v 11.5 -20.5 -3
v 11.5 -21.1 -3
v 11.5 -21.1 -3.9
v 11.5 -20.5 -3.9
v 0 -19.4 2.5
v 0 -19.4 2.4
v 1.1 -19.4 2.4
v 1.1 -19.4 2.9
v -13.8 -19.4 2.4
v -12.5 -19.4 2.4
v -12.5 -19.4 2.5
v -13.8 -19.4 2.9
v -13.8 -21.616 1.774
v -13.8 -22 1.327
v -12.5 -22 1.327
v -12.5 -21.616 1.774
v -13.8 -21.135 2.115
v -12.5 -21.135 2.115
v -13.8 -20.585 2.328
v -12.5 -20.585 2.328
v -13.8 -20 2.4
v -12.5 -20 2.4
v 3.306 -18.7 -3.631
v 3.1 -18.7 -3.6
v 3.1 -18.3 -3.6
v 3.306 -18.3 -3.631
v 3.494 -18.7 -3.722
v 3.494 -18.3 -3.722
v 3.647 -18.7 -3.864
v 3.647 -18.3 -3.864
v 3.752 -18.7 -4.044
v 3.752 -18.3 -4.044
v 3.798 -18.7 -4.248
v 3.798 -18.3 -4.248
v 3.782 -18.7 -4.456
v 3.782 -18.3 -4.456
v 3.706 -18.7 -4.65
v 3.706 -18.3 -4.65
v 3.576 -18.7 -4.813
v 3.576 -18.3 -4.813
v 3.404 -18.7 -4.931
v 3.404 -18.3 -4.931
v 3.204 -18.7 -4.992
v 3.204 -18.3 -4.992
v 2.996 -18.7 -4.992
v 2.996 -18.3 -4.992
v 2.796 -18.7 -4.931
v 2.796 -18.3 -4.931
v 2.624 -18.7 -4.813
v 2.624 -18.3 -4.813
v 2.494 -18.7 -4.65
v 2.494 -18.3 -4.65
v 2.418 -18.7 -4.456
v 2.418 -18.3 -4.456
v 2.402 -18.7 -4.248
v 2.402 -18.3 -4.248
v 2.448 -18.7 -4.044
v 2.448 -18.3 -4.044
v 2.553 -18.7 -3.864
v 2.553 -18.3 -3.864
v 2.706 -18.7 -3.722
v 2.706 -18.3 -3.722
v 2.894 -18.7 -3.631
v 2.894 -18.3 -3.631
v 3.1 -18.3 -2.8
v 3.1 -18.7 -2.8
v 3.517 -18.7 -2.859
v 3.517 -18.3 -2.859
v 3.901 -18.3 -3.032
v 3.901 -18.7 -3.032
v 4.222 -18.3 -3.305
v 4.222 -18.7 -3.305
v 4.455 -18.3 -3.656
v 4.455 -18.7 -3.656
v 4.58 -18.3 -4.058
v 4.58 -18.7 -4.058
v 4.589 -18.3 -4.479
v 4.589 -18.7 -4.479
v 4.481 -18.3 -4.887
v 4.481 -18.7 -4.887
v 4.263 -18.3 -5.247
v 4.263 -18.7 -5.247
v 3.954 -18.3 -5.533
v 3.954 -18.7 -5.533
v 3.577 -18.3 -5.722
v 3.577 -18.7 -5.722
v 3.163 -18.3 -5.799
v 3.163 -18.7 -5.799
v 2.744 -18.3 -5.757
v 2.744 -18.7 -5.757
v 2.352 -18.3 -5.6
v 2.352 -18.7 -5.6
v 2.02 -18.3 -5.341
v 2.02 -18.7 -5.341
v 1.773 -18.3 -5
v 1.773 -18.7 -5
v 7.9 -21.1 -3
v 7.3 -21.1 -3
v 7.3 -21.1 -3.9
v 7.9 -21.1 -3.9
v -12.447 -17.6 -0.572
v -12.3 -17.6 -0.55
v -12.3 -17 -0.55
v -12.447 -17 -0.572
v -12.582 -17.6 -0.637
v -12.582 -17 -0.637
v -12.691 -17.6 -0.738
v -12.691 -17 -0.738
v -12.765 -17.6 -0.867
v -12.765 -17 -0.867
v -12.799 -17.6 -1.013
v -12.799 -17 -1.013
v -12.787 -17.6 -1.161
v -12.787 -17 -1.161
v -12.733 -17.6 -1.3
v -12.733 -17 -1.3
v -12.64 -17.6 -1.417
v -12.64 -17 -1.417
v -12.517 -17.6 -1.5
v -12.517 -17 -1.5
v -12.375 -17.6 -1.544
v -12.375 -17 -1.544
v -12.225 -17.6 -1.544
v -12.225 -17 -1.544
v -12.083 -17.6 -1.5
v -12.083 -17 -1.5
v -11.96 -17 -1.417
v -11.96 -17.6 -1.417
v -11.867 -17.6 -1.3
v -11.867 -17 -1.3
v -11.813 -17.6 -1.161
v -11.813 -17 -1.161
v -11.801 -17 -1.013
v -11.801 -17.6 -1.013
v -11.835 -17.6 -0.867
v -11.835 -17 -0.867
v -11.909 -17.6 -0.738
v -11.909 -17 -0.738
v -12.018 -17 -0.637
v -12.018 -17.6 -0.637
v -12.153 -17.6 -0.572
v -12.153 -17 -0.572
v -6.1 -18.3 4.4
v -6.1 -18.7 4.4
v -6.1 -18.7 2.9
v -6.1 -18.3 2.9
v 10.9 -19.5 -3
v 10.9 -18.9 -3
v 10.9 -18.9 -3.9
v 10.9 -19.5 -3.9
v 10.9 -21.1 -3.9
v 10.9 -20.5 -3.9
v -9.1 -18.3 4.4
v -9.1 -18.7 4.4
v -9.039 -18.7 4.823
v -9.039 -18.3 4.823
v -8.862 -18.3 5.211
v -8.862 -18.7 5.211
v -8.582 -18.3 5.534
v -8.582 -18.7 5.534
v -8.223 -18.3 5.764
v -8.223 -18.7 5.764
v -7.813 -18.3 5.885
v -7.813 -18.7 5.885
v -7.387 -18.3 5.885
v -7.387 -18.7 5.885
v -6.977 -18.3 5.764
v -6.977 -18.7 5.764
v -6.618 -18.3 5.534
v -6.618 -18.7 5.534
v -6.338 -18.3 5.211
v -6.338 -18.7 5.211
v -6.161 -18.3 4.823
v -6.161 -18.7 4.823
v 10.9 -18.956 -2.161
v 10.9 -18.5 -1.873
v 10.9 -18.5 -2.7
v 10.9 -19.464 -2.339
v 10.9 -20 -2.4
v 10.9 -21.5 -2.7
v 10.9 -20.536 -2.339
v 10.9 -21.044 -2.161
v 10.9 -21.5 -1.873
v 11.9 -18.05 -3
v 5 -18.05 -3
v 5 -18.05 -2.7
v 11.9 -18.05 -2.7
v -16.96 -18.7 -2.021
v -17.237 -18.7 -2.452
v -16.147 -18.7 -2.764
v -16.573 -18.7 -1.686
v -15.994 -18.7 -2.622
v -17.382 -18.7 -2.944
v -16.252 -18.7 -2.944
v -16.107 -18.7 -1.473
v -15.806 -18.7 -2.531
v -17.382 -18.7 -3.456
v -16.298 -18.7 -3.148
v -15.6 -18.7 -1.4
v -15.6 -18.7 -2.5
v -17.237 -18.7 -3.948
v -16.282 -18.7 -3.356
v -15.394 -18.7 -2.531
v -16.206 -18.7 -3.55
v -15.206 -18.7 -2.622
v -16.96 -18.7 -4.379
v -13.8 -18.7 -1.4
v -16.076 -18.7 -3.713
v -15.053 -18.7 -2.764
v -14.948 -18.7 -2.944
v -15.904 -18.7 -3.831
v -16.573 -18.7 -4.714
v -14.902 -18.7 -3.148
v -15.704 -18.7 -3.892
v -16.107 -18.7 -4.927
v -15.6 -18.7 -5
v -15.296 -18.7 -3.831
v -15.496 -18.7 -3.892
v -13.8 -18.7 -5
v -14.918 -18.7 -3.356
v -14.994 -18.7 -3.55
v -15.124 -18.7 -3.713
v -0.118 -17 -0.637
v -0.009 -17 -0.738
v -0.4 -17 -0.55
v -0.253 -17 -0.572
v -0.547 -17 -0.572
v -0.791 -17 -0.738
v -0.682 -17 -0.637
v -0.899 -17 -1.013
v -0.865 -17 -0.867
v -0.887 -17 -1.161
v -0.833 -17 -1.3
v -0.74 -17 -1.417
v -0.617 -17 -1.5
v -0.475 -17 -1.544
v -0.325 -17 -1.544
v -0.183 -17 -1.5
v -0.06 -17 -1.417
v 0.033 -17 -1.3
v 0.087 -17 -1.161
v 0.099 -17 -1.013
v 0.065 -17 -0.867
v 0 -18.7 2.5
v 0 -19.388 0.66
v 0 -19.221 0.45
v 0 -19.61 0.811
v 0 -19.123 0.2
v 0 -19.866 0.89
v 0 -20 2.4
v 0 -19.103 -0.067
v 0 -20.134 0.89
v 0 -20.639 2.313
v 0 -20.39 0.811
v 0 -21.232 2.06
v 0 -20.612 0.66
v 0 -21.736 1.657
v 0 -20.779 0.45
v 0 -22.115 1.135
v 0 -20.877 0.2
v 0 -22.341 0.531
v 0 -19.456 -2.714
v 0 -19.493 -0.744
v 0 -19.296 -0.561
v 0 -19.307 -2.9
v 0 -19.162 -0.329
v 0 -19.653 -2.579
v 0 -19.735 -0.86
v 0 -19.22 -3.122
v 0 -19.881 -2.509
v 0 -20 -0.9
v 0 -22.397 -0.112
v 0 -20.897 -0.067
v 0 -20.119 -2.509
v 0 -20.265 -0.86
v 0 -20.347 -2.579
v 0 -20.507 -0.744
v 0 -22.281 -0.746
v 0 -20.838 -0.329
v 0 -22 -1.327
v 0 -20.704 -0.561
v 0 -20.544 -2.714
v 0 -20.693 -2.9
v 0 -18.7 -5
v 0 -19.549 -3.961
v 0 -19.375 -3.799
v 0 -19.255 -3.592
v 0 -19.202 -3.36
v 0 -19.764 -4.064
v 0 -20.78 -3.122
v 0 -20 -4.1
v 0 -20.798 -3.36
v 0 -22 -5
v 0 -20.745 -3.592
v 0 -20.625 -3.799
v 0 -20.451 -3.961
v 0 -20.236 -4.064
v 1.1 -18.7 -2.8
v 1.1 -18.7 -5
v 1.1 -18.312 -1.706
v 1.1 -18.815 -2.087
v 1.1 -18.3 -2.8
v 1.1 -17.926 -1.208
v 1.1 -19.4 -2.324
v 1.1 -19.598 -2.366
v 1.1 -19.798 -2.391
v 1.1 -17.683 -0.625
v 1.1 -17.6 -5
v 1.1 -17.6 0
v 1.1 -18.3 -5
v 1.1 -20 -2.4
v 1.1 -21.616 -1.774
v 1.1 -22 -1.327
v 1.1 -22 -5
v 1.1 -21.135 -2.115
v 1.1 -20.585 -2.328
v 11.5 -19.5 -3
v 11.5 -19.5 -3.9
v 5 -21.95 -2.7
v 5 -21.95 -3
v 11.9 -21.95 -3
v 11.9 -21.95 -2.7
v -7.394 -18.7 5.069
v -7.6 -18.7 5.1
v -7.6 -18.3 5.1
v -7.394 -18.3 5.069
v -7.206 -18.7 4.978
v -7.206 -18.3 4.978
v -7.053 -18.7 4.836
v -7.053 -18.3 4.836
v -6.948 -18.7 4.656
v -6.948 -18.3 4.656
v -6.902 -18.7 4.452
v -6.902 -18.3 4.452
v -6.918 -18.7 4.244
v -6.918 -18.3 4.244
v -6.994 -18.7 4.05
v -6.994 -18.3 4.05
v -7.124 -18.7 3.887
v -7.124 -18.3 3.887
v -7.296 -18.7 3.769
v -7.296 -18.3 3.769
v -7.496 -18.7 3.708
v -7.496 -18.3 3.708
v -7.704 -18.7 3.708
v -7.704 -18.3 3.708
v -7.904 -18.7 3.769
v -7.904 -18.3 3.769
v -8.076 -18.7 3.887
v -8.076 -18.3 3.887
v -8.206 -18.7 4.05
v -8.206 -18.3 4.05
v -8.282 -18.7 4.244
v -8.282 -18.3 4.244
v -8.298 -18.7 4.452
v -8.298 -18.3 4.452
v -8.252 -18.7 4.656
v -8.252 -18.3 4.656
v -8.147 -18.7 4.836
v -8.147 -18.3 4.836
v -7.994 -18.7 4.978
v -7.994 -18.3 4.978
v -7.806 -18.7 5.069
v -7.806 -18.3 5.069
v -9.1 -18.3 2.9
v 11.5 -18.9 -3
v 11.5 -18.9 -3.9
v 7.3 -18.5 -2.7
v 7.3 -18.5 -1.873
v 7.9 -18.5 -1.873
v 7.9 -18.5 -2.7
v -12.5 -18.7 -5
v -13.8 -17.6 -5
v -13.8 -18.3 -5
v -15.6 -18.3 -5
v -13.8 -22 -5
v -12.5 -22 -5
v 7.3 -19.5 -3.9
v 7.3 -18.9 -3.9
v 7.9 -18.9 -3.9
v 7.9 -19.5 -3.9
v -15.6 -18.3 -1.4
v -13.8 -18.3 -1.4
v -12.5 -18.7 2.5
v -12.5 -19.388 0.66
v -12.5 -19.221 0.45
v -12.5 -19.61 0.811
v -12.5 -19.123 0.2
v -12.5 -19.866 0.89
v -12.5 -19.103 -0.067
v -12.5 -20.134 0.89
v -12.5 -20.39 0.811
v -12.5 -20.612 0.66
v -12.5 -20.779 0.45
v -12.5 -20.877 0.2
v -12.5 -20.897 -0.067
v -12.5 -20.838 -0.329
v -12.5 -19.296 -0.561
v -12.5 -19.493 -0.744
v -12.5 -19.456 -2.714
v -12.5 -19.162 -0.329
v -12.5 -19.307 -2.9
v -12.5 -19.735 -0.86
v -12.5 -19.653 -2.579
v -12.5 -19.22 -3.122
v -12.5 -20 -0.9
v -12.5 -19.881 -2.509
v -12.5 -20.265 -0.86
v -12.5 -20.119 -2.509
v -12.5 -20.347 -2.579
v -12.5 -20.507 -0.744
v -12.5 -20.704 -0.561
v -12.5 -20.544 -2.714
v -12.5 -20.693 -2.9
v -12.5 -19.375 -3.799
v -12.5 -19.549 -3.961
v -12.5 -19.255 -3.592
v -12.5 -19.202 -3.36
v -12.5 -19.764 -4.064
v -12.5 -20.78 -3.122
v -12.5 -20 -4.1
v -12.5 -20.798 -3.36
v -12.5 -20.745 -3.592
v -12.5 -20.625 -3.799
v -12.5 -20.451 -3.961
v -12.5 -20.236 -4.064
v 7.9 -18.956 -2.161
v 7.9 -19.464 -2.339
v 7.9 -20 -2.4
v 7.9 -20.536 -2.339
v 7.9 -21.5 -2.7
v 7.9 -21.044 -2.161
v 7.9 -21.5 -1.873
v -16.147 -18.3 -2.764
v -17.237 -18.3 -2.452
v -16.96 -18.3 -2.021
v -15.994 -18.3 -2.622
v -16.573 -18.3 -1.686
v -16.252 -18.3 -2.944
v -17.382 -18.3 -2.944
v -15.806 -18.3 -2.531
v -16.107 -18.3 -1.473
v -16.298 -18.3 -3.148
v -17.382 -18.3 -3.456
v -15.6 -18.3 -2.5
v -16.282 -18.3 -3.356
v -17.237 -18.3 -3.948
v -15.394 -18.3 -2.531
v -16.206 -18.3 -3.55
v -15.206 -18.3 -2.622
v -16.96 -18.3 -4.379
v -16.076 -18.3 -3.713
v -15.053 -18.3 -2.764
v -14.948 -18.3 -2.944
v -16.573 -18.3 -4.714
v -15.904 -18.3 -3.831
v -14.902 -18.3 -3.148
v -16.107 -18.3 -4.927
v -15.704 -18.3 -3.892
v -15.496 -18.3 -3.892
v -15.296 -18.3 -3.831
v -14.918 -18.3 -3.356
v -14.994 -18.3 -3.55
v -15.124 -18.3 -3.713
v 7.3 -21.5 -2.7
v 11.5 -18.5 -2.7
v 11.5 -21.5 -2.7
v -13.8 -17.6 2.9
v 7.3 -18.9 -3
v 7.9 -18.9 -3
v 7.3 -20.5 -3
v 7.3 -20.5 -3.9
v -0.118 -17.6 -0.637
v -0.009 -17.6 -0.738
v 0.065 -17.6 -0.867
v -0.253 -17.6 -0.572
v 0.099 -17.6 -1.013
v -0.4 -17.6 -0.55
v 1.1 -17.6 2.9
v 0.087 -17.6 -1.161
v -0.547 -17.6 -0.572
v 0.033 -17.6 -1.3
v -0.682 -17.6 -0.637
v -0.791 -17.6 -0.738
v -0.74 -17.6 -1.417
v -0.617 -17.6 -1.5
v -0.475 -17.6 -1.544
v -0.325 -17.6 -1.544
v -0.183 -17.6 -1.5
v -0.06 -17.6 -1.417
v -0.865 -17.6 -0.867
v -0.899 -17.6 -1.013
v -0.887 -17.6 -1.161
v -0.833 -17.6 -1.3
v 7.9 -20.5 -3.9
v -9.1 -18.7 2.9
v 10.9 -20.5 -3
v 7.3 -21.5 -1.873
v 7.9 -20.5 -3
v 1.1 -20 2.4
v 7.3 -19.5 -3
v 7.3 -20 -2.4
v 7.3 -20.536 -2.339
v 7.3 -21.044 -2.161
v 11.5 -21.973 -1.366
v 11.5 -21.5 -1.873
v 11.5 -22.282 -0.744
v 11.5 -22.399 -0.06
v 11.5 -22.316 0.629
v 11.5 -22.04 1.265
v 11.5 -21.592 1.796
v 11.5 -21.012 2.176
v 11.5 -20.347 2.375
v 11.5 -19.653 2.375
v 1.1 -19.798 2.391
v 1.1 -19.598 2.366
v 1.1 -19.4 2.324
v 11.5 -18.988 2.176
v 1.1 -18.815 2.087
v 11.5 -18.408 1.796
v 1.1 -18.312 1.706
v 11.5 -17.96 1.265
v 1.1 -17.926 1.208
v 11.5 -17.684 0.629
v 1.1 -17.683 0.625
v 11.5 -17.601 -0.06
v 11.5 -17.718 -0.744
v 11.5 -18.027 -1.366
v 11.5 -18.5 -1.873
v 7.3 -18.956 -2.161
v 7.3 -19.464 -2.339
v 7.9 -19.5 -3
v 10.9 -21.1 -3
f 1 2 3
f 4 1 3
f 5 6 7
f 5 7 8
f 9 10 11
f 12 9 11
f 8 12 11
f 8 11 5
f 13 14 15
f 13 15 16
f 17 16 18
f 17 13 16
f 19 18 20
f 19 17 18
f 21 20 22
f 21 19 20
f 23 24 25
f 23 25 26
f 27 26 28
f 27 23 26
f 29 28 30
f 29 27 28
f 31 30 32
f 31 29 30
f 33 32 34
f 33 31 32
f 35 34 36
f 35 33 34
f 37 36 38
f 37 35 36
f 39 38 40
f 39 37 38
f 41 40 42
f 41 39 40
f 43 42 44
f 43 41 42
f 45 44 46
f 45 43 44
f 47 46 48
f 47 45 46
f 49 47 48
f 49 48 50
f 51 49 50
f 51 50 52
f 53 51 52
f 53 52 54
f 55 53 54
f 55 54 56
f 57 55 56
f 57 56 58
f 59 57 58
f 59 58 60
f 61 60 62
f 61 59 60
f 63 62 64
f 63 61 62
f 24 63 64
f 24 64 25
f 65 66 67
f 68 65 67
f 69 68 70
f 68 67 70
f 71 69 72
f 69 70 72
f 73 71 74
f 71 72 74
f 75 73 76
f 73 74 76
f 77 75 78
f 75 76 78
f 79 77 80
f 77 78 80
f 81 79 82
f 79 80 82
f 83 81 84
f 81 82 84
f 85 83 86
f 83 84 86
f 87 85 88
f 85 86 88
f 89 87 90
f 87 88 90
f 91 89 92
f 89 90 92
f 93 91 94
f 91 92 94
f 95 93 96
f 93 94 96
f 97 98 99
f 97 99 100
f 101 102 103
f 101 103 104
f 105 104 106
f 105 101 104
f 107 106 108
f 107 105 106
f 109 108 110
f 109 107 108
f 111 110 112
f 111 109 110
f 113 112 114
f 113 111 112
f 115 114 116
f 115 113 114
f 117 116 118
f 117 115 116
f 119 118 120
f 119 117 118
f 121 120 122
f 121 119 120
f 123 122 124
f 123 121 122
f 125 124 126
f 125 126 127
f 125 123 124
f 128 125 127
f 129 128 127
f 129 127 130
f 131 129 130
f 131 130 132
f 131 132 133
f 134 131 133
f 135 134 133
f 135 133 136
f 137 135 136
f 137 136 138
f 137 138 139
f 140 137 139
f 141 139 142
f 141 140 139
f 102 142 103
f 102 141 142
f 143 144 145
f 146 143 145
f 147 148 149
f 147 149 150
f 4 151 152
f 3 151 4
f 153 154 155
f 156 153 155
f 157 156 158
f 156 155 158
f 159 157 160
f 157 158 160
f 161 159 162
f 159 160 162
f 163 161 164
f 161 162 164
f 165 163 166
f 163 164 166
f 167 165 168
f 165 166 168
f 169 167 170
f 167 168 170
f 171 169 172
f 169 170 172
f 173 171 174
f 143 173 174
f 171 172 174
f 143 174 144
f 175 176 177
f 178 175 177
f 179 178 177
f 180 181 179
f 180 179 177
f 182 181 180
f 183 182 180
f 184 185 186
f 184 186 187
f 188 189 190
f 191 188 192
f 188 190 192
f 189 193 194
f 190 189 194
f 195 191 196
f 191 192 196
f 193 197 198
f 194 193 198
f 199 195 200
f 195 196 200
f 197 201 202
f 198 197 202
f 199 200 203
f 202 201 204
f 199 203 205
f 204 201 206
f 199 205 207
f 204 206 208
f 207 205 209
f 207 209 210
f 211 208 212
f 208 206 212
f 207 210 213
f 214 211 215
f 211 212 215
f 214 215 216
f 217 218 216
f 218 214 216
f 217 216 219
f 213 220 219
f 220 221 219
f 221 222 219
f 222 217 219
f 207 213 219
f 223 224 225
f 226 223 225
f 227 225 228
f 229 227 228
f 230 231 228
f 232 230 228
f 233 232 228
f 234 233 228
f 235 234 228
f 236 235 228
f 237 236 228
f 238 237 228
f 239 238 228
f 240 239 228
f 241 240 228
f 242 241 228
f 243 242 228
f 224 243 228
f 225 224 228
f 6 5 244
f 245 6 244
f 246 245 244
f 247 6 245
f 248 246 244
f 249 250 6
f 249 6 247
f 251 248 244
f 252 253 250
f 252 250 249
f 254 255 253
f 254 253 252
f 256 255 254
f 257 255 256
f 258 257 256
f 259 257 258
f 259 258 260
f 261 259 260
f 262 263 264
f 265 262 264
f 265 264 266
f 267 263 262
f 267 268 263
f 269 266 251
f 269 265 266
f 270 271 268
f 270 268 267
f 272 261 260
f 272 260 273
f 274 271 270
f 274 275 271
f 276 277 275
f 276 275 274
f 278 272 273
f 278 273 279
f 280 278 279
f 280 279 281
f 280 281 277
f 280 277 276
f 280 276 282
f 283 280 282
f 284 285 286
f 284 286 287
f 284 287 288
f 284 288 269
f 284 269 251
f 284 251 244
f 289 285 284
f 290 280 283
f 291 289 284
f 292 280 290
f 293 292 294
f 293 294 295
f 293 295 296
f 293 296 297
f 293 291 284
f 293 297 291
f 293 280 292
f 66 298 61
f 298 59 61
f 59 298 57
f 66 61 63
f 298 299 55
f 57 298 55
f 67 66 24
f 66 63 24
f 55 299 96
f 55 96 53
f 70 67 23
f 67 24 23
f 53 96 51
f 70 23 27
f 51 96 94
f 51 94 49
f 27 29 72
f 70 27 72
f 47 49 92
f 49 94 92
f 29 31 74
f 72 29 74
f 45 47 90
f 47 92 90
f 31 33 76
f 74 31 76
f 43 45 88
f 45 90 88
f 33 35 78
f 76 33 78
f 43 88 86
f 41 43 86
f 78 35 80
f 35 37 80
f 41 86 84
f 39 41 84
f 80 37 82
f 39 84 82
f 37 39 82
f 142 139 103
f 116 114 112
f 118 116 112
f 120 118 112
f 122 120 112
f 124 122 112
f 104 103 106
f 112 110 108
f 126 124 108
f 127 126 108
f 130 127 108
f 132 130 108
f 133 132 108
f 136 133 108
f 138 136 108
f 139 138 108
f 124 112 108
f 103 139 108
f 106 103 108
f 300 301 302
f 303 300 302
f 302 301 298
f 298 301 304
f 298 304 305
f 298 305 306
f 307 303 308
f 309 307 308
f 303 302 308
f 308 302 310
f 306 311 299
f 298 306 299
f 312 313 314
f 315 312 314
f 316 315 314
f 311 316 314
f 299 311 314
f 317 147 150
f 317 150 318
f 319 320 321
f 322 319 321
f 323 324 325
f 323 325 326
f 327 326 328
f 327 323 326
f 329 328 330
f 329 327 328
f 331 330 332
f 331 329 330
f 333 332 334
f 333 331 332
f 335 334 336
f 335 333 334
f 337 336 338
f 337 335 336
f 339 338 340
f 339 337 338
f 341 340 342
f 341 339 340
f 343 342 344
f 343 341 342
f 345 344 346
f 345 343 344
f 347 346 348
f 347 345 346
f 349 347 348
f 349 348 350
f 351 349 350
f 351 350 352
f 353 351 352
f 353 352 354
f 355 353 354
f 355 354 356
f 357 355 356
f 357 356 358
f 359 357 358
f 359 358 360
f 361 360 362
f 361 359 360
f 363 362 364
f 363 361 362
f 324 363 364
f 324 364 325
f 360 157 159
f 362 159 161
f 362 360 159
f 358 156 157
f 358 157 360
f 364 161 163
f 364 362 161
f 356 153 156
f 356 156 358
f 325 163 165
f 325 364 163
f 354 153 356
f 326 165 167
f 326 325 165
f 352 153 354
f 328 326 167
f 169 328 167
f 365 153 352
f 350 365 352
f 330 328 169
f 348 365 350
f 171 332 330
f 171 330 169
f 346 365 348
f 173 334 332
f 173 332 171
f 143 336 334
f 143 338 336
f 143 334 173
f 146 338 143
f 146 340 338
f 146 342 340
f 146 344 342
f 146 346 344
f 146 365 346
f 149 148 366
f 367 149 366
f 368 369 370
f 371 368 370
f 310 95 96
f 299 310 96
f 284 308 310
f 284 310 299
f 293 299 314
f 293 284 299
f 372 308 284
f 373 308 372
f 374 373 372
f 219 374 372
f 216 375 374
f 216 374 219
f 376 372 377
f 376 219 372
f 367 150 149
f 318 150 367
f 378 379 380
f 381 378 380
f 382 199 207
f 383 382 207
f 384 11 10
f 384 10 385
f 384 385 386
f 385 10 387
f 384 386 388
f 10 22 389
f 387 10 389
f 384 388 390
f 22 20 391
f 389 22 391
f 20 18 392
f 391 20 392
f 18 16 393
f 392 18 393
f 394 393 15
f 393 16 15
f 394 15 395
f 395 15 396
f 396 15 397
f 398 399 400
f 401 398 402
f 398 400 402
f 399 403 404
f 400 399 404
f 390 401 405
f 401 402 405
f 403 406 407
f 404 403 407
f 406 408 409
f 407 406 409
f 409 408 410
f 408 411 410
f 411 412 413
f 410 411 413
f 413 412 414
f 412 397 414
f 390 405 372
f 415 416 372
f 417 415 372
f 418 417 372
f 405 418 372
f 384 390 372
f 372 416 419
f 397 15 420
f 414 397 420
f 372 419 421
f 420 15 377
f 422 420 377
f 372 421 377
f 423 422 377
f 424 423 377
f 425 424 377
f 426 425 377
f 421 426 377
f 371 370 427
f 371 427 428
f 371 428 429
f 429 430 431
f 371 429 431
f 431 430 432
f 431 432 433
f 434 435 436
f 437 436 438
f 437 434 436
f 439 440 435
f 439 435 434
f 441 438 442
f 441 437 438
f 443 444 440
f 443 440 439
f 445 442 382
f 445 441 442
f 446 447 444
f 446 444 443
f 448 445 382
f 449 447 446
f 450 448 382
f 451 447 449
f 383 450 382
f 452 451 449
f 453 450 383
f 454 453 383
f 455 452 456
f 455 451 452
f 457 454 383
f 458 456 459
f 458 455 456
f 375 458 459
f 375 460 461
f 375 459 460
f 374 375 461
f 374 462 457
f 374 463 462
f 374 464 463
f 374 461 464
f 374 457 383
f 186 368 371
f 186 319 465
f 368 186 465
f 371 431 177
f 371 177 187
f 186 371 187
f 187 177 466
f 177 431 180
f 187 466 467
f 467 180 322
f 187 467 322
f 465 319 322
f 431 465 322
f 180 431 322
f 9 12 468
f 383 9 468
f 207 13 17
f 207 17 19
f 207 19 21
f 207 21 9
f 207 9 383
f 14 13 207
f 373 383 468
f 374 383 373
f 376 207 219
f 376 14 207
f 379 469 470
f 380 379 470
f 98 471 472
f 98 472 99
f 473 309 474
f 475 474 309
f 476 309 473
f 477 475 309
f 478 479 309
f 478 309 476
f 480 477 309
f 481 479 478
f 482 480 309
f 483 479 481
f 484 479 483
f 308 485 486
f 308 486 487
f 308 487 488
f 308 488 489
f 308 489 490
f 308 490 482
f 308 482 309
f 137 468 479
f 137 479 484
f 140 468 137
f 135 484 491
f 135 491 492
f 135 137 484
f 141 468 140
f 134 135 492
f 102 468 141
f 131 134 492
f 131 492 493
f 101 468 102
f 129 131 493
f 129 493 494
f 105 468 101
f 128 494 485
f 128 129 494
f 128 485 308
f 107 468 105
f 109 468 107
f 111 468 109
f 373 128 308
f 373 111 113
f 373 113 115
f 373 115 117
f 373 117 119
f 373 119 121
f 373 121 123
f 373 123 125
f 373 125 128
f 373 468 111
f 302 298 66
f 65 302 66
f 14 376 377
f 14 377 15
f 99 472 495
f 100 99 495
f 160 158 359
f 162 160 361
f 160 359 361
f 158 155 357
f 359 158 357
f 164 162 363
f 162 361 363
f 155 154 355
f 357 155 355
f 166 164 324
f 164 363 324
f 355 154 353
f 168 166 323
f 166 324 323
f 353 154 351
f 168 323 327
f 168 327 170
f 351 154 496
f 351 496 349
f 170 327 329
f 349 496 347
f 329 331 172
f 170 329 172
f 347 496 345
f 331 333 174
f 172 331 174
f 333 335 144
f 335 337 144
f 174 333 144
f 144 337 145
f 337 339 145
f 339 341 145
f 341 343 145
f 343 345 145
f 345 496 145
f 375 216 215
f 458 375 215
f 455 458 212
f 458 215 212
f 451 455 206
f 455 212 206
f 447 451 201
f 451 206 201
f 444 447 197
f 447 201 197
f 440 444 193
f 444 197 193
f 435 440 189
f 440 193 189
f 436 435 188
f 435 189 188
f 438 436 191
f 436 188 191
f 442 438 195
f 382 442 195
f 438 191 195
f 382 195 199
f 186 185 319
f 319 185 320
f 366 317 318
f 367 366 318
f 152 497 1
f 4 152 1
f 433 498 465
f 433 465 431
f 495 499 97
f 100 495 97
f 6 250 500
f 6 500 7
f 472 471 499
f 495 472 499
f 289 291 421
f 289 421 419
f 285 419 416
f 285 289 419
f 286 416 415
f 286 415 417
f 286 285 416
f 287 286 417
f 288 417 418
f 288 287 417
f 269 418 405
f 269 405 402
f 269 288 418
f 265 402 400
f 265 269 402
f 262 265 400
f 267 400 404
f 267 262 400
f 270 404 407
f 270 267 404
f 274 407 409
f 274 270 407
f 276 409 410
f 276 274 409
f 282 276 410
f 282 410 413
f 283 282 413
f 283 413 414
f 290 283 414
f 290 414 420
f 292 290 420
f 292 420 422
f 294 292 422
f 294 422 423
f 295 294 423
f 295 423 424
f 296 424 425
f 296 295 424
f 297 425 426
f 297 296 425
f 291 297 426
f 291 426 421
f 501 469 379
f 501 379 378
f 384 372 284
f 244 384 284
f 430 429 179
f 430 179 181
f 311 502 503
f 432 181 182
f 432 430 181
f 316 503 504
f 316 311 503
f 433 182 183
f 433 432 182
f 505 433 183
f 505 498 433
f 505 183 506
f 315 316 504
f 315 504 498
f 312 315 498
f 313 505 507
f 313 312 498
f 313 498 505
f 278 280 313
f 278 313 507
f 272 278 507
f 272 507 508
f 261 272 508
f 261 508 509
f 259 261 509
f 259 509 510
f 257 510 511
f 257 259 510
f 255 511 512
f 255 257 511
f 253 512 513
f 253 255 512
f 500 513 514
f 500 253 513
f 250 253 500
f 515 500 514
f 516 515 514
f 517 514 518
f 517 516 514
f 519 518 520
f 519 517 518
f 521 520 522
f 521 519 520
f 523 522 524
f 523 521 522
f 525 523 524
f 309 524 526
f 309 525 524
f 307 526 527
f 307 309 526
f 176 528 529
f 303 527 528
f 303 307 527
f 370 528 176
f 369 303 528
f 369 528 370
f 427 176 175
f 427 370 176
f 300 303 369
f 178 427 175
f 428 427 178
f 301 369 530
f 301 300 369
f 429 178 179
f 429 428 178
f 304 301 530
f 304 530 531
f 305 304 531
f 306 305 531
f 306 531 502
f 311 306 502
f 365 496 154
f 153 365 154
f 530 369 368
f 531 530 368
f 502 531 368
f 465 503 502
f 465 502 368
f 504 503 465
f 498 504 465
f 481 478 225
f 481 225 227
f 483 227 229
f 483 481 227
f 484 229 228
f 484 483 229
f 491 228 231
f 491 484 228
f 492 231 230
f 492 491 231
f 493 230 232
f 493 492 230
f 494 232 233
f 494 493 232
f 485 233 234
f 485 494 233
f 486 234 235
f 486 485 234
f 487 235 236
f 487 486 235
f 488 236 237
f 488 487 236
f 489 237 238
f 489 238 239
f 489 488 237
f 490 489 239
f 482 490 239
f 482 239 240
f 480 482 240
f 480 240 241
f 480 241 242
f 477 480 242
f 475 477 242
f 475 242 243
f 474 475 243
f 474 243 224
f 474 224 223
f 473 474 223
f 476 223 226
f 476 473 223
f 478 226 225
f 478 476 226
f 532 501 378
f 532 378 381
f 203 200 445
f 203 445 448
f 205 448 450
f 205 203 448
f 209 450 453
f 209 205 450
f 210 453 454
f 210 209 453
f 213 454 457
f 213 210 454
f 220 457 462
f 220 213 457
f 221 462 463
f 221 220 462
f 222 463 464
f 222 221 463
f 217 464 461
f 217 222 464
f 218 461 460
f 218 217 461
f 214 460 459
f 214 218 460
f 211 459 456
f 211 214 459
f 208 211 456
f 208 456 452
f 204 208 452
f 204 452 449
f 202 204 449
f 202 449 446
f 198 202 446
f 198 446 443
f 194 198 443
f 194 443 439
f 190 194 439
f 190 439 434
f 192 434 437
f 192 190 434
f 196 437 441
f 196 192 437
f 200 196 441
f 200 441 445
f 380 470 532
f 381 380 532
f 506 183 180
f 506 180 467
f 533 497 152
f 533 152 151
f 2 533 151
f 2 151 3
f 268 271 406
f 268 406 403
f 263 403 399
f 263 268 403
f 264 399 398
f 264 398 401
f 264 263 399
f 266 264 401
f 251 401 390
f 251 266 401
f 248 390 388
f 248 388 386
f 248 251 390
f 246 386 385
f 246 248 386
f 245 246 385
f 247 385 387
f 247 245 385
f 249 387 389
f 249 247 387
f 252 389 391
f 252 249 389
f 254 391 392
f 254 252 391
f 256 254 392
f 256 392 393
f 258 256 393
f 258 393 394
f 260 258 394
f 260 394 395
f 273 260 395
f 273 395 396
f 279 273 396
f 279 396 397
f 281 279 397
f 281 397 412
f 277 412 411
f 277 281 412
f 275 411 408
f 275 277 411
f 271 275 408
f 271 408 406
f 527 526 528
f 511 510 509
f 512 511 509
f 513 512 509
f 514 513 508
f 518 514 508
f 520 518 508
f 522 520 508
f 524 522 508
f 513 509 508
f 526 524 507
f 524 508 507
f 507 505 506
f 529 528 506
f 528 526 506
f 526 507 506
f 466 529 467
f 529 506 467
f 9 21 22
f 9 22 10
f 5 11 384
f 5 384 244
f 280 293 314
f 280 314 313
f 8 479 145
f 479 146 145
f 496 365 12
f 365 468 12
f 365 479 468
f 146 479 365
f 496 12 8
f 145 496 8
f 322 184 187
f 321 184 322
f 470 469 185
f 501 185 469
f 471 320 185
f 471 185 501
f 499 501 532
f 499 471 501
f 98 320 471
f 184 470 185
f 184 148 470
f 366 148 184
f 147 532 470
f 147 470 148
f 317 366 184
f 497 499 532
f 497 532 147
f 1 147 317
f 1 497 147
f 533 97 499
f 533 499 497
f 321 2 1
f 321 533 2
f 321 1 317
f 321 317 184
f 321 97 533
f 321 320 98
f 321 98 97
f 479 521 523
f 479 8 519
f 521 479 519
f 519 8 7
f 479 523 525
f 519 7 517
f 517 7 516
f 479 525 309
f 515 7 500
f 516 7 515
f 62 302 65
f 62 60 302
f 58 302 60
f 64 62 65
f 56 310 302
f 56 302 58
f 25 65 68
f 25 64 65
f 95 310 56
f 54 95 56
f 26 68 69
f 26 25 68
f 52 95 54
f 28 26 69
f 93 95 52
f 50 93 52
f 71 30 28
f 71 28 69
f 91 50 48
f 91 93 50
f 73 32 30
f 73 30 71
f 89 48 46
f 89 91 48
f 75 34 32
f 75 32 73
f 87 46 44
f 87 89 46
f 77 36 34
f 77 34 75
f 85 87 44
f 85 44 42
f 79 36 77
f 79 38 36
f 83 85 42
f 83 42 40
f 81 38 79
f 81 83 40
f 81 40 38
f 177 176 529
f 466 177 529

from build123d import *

# Parameters (mm, degrees)
SKETCH_1_R          = 2.4
EXTRUDE_1_DEPTH     = 11.5
SKETCH_1_7_W        = 0.5
SKETCH_1_7_H        = 1.8
EXTRUDE_3_DEPTH     = 1.1
EXTRUDE_START       = -13.8
SKETCH_1_8_W        = 0.5
SKETCH_1_8_H        = 1.8
EXTRUDE_4_DEPTH     = 14.9
EXTRUDE_5_DEPTH     = 1.3
SKETCH_3_W          = 0.6
SKETCH_3_H          = 0.6
EXTRUDE_6_DEPTH     = 3.9
SKETCH_3_3_W        = 0.6
SKETCH_3_3_H        = 3
EXTRUDE_7_DEPTH     = 3
EXTRUDE_START_2     = -3
SKETCH_4_W          = 6.9
SKETCH_4_H          = 3.9
EXTRUDE_8_DEPTH     = 0.3
SKETCH_6_W          = 12.5
SKETCH_6_H          = 7.5
CUT_EXTRUDE_1_DEPTH = 0.7
EXTRUDE_START_3     = -1.3
SKETCH_5_R          = 0.7
EXTRUDE_9_DEPTH     = 0.4
SKETCH_7_R          = 0.9
SKETCH_7_R_2        = 0.8
EXTRUDE_10_DEPTH    = 12.5
SKETCH_8_R          = 0.5
EXTRUDE_11_DEPTH    = 0.6
SKETCH_9_W          = 55.778584291
SKETCH_9_H          = 36.536448335
CUT_EXTRUDE_2_DEPTH = 23.165964901


with BuildPart() as part:
    # 草图1 → 凸台-拉伸1 (new body)
    with BuildSketch(Plane(origin=(0, 0, 0), x_dir=(0, 0, -1), z_dir=(1, 0, 0))):
        Circle(SKETCH_1_R)
    extrude(amount=EXTRUDE_1_DEPTH)

    # 草图1<7> → 凸台-拉伸3 (add)
    with BuildSketch(Plane(origin=(0, 0, 0), x_dir=(0, 0, -1), z_dir=(1, 0, 0))):
        with BuildLine():
            Line((5, -0.6), (2.323790008, -0.6))
            ThreePointArc((2.323790008, -0.6), (1.469693849, -1.897366594), (8e-09, -2.4))
            Line((8e-09, -2.4), (5, -2.4))
            Line((5, -2.4), (5, -0.6))
        make_face()
        with BuildLine():
            Line((-2.323790008, -0.6), (-2.4, -0.6))
            Line((-2.4, -0.6), (-2.4, -2.4))
            Line((-2.4, -2.4), (8e-09, -2.4))
            ThreePointArc((8e-09, -2.4), (-1.469693842, -1.897366599), (-2.323790008, -0.6))
        make_face()
        with Locations((-2.65, -1.5)):
            Rectangle(SKETCH_1_7_W, SKETCH_1_7_H)
        with BuildLine():
            Line((5, 2), (1.326649916, 2))
            ThreePointArc((1.326649916, 2), (2.114705629, 1.134909732), (2.4, 0))
            ThreePointArc((2.4, 0), (2.380871271, -0.302410302), (2.323790008, -0.6))
            Line((2.323790008, -0.6), (5, -0.6))
            Line((5, -0.6), (5, 2))
        make_face()
        with BuildLine():
            ThreePointArc((-2.323790008, -0.6), (-2.380871271, -0.302410299), (-2.4, 5e-09))
            Line((-2.4, 5e-09), (-2.4, -0.6))
            Line((-2.4, -0.6), (-2.323790008, -0.6))
        make_face()
    extrude(amount=EXTRUDE_3_DEPTH)

    # 草图1<8> → 凸台-拉伸4 (add)
    with BuildSketch(Plane(origin=(0, 0, 0), x_dir=(0, 0, -1), z_dir=(1, 0, 0)).offset(EXTRUDE_START)):
        with BuildLine():
            Line((5, -0.6), (2.323790008, -0.6))
            ThreePointArc((2.323790008, -0.6), (1.469693849, -1.897366594), (8e-09, -2.4))
            Line((8e-09, -2.4), (5, -2.4))
            Line((5, -2.4), (5, -0.6))
        make_face()
        with BuildLine():
            Line((2.323790008, -0.6), (-2.323790008, -0.6))
            ThreePointArc((-2.323790008, -0.6), (-1.469693842, -1.897366599), (8e-09, -2.4))
            ThreePointArc((8e-09, -2.4), (1.469693849, -1.897366594), (2.323790008, -0.6))
        make_face()
        with BuildLine():
            Line((-2.323790008, -0.6), (-2.4, -0.6))
            Line((-2.4, -0.6), (-2.4, -2.4))
            Line((-2.4, -2.4), (8e-09, -2.4))
            ThreePointArc((8e-09, -2.4), (-1.469693842, -1.897366599), (-2.323790008, -0.6))
        make_face()
        with Locations((-2.65, -1.5)):
            Rectangle(SKETCH_1_8_W, SKETCH_1_8_H)
    extrude(amount=EXTRUDE_4_DEPTH)

    # 草图1<9> → 凸台-拉伸5 (add)
    with BuildSketch(Plane(origin=(0, 0, 0), x_dir=(0, 0, -1), z_dir=(1, 0, 0)).offset(EXTRUDE_START)):
        with BuildLine():
            Line((5, 2), (1.326649916, 2))
            ThreePointArc((1.326649916, 2), (2.114705629, 1.134909732), (2.4, 0))
            ThreePointArc((2.4, 0), (2.380871271, -0.302410302), (2.323790008, -0.6))
            Line((2.323790008, -0.6), (5, -0.6))
            Line((5, -0.6), (5, 2))
        make_face()
        with BuildLine():
            Line((1.326649916, 2), (-1.326649916, 2))
            ThreePointArc((-1.326649916, 2), (-2.114705628, 1.134909735), (-2.4, 5e-09))
            ThreePointArc((-2.4, 5e-09), (-2.380871271, -0.302410299), (-2.323790008, -0.6))
            Line((-2.323790008, -0.6), (2.323790008, -0.6))
            ThreePointArc((2.323790008, -0.6), (2.380871271, -0.302410302), (2.4, 0))
            ThreePointArc((2.4, 0), (2.114705629, 1.134909732), (1.326649916, 2))
        make_face()
        with BuildLine():
            ThreePointArc((-2.323790008, -0.6), (-2.380871271, -0.302410299), (-2.4, 5e-09))
            Line((-2.4, 5e-09), (-2.4, -0.6))
            Line((-2.4, -0.6), (-2.323790008, -0.6))
        make_face()
    extrude(amount=EXTRUDE_5_DEPTH)

    # 草图3 → 凸台-拉伸6 (add)
    with BuildSketch(Plane.XY):
        with Locations((11.2, 0.8)):
            Rectangle(SKETCH_3_W, SKETCH_3_H)
        with Locations((11.2, -0.8)):
            Rectangle(SKETCH_3_W, SKETCH_3_H)
        with Locations((7.6, 0.8)):
            Rectangle(SKETCH_3_W, SKETCH_3_H)
        with Locations((7.6, -0.8)):
            Rectangle(SKETCH_3_W, SKETCH_3_H)
    extrude(amount=-EXTRUDE_6_DEPTH)

    # 草图3<3> → 凸台-拉伸7 (add)
    with BuildSketch(Plane.XY):
        with Locations((11.2, 0)):
            Rectangle(SKETCH_3_3_W, SKETCH_3_3_H)
        with Locations((7.6, 0)):
            Rectangle(SKETCH_3_3_W, SKETCH_3_3_H)
    extrude(amount=-EXTRUDE_7_DEPTH)

    # 草图4 → 凸台-拉伸8 (add)
    with BuildSketch(Plane.XY.offset(EXTRUDE_START_2)):
        with Locations((8.45, 0)):
            Rectangle(SKETCH_4_W, SKETCH_4_H)
    extrude(amount=EXTRUDE_8_DEPTH)

    # 草图6 → 切除-拉伸1 (cut)
    with BuildSketch(Plane(origin=(0, -0.6, 0), x_dir=(1, 0, 0), z_dir=(0, 1, 0))):
        with Locations((-6.25, 1.25)):
            Rectangle(SKETCH_6_W, SKETCH_6_H)
    extrude(amount=-CUT_EXTRUDE_1_DEPTH, mode=Mode.SUBTRACT)

    # 草图5 → 凸台-拉伸9 (add)
    # profile 1 of 3: a face of its own
    with BuildSketch(Plane(origin=(0, 0, 0), x_dir=(1, 0, 0), z_dir=(0, 1, 0)).offset(EXTRUDE_START_3)):
        with BuildLine():
            ThreePointArc((3.1, 2.8), (4.384523258, 5.074596669), (1.773350084, 5))
            Line((1.773350084, 5), (1.1, 5))
            Line((1.1, 5), (1.1, 2.8))
            Line((1.1, 2.8), (3.1, 2.8))
        make_face()
        with Locations(Location((3.1, 4.3, 0), (0, 0, 270))):
            Circle(SKETCH_5_R, mode=Mode.SUBTRACT)
    # profile 2 of 3: a face of its own
    with BuildSketch(Plane(origin=(0, 0, 0), x_dir=(1, 0, 0), z_dir=(0, 1, 0)).offset(EXTRUDE_START_3)):
        with BuildLine():
            Line((-6.1, -4.4), (-6.1, -2.9))
            Line((-6.1, -2.9), (-9.1, -2.9))
            Line((-9.1, -2.9), (-9.1, -4.4))
            ThreePointArc((-9.1, -4.4), (-7.6, -5.9), (-6.1, -4.4))
        make_face()
        with Locations(Location((-7.6, -4.4, 0), (0, 0, 270))):
            Circle(SKETCH_5_R, mode=Mode.SUBTRACT)
    # profile 3 of 3: a face of its own
    with BuildSketch(Plane(origin=(0, 0, 0), x_dir=(1, 0, 0), z_dir=(0, 1, 0)).offset(EXTRUDE_START_3)):
        with BuildLine():
            Line((-13.8, 5), (-15.6, 5))
            ThreePointArc((-15.6, 5), (-17.4, 3.2), (-15.6, 1.4))
            Line((-15.6, 1.4), (-13.8, 1.4))
            Line((-13.8, 1.4), (-13.8, 5))
        make_face()
        with Locations(Location((-15.6, 3.2, 0), (0, 0, 270))):
            Circle(SKETCH_5_R, mode=Mode.SUBTRACT)
    extrude(amount=-EXTRUDE_9_DEPTH)

    # 草图7 → 凸台-拉伸10 (add)
    with BuildSketch(Plane.ZY):
        with Locations(Location((0, 0, 0), (0, 0, 180))):
            Circle(SKETCH_7_R)
        with Locations(Location((-3.3, 0, 0), (0, 0, 180))):
            Circle(SKETCH_7_R_2)
    extrude(amount=EXTRUDE_10_DEPTH)

    # 草图8 → 凸台-拉伸11 (add)
    with BuildSketch(Plane.XZ.offset(2.4)):
        with Locations(Location((-12.3, -1.05, 0), (0, 0, 90))):
            Circle(SKETCH_8_R)
        with Locations(Location((-0.4, -1.05, 0), (0, 0, 90))):
            Circle(SKETCH_8_R)
    extrude(amount=EXTRUDE_11_DEPTH)


with BuildPart() as body_2:
    # 镜向2: mirrored copy
    add(part.part.mirror(Plane.ZX.offset(-10)))


with BuildPart() as part_1:
    add(part.part)

    # 草图9 → 切除-拉伸2 (cut, through all)
    with BuildSketch(Plane(origin=(0, -10, 0), x_dir=(1, 0, 0), z_dir=(0, 1, 0))):
        with Locations((1.175159636, 0.404925991)):
            Rectangle(SKETCH_9_W, SKETCH_9_H)
    extrude(amount=CUT_EXTRUDE_2_DEPTH, mode=Mode.SUBTRACT)


solid = body_2.part
